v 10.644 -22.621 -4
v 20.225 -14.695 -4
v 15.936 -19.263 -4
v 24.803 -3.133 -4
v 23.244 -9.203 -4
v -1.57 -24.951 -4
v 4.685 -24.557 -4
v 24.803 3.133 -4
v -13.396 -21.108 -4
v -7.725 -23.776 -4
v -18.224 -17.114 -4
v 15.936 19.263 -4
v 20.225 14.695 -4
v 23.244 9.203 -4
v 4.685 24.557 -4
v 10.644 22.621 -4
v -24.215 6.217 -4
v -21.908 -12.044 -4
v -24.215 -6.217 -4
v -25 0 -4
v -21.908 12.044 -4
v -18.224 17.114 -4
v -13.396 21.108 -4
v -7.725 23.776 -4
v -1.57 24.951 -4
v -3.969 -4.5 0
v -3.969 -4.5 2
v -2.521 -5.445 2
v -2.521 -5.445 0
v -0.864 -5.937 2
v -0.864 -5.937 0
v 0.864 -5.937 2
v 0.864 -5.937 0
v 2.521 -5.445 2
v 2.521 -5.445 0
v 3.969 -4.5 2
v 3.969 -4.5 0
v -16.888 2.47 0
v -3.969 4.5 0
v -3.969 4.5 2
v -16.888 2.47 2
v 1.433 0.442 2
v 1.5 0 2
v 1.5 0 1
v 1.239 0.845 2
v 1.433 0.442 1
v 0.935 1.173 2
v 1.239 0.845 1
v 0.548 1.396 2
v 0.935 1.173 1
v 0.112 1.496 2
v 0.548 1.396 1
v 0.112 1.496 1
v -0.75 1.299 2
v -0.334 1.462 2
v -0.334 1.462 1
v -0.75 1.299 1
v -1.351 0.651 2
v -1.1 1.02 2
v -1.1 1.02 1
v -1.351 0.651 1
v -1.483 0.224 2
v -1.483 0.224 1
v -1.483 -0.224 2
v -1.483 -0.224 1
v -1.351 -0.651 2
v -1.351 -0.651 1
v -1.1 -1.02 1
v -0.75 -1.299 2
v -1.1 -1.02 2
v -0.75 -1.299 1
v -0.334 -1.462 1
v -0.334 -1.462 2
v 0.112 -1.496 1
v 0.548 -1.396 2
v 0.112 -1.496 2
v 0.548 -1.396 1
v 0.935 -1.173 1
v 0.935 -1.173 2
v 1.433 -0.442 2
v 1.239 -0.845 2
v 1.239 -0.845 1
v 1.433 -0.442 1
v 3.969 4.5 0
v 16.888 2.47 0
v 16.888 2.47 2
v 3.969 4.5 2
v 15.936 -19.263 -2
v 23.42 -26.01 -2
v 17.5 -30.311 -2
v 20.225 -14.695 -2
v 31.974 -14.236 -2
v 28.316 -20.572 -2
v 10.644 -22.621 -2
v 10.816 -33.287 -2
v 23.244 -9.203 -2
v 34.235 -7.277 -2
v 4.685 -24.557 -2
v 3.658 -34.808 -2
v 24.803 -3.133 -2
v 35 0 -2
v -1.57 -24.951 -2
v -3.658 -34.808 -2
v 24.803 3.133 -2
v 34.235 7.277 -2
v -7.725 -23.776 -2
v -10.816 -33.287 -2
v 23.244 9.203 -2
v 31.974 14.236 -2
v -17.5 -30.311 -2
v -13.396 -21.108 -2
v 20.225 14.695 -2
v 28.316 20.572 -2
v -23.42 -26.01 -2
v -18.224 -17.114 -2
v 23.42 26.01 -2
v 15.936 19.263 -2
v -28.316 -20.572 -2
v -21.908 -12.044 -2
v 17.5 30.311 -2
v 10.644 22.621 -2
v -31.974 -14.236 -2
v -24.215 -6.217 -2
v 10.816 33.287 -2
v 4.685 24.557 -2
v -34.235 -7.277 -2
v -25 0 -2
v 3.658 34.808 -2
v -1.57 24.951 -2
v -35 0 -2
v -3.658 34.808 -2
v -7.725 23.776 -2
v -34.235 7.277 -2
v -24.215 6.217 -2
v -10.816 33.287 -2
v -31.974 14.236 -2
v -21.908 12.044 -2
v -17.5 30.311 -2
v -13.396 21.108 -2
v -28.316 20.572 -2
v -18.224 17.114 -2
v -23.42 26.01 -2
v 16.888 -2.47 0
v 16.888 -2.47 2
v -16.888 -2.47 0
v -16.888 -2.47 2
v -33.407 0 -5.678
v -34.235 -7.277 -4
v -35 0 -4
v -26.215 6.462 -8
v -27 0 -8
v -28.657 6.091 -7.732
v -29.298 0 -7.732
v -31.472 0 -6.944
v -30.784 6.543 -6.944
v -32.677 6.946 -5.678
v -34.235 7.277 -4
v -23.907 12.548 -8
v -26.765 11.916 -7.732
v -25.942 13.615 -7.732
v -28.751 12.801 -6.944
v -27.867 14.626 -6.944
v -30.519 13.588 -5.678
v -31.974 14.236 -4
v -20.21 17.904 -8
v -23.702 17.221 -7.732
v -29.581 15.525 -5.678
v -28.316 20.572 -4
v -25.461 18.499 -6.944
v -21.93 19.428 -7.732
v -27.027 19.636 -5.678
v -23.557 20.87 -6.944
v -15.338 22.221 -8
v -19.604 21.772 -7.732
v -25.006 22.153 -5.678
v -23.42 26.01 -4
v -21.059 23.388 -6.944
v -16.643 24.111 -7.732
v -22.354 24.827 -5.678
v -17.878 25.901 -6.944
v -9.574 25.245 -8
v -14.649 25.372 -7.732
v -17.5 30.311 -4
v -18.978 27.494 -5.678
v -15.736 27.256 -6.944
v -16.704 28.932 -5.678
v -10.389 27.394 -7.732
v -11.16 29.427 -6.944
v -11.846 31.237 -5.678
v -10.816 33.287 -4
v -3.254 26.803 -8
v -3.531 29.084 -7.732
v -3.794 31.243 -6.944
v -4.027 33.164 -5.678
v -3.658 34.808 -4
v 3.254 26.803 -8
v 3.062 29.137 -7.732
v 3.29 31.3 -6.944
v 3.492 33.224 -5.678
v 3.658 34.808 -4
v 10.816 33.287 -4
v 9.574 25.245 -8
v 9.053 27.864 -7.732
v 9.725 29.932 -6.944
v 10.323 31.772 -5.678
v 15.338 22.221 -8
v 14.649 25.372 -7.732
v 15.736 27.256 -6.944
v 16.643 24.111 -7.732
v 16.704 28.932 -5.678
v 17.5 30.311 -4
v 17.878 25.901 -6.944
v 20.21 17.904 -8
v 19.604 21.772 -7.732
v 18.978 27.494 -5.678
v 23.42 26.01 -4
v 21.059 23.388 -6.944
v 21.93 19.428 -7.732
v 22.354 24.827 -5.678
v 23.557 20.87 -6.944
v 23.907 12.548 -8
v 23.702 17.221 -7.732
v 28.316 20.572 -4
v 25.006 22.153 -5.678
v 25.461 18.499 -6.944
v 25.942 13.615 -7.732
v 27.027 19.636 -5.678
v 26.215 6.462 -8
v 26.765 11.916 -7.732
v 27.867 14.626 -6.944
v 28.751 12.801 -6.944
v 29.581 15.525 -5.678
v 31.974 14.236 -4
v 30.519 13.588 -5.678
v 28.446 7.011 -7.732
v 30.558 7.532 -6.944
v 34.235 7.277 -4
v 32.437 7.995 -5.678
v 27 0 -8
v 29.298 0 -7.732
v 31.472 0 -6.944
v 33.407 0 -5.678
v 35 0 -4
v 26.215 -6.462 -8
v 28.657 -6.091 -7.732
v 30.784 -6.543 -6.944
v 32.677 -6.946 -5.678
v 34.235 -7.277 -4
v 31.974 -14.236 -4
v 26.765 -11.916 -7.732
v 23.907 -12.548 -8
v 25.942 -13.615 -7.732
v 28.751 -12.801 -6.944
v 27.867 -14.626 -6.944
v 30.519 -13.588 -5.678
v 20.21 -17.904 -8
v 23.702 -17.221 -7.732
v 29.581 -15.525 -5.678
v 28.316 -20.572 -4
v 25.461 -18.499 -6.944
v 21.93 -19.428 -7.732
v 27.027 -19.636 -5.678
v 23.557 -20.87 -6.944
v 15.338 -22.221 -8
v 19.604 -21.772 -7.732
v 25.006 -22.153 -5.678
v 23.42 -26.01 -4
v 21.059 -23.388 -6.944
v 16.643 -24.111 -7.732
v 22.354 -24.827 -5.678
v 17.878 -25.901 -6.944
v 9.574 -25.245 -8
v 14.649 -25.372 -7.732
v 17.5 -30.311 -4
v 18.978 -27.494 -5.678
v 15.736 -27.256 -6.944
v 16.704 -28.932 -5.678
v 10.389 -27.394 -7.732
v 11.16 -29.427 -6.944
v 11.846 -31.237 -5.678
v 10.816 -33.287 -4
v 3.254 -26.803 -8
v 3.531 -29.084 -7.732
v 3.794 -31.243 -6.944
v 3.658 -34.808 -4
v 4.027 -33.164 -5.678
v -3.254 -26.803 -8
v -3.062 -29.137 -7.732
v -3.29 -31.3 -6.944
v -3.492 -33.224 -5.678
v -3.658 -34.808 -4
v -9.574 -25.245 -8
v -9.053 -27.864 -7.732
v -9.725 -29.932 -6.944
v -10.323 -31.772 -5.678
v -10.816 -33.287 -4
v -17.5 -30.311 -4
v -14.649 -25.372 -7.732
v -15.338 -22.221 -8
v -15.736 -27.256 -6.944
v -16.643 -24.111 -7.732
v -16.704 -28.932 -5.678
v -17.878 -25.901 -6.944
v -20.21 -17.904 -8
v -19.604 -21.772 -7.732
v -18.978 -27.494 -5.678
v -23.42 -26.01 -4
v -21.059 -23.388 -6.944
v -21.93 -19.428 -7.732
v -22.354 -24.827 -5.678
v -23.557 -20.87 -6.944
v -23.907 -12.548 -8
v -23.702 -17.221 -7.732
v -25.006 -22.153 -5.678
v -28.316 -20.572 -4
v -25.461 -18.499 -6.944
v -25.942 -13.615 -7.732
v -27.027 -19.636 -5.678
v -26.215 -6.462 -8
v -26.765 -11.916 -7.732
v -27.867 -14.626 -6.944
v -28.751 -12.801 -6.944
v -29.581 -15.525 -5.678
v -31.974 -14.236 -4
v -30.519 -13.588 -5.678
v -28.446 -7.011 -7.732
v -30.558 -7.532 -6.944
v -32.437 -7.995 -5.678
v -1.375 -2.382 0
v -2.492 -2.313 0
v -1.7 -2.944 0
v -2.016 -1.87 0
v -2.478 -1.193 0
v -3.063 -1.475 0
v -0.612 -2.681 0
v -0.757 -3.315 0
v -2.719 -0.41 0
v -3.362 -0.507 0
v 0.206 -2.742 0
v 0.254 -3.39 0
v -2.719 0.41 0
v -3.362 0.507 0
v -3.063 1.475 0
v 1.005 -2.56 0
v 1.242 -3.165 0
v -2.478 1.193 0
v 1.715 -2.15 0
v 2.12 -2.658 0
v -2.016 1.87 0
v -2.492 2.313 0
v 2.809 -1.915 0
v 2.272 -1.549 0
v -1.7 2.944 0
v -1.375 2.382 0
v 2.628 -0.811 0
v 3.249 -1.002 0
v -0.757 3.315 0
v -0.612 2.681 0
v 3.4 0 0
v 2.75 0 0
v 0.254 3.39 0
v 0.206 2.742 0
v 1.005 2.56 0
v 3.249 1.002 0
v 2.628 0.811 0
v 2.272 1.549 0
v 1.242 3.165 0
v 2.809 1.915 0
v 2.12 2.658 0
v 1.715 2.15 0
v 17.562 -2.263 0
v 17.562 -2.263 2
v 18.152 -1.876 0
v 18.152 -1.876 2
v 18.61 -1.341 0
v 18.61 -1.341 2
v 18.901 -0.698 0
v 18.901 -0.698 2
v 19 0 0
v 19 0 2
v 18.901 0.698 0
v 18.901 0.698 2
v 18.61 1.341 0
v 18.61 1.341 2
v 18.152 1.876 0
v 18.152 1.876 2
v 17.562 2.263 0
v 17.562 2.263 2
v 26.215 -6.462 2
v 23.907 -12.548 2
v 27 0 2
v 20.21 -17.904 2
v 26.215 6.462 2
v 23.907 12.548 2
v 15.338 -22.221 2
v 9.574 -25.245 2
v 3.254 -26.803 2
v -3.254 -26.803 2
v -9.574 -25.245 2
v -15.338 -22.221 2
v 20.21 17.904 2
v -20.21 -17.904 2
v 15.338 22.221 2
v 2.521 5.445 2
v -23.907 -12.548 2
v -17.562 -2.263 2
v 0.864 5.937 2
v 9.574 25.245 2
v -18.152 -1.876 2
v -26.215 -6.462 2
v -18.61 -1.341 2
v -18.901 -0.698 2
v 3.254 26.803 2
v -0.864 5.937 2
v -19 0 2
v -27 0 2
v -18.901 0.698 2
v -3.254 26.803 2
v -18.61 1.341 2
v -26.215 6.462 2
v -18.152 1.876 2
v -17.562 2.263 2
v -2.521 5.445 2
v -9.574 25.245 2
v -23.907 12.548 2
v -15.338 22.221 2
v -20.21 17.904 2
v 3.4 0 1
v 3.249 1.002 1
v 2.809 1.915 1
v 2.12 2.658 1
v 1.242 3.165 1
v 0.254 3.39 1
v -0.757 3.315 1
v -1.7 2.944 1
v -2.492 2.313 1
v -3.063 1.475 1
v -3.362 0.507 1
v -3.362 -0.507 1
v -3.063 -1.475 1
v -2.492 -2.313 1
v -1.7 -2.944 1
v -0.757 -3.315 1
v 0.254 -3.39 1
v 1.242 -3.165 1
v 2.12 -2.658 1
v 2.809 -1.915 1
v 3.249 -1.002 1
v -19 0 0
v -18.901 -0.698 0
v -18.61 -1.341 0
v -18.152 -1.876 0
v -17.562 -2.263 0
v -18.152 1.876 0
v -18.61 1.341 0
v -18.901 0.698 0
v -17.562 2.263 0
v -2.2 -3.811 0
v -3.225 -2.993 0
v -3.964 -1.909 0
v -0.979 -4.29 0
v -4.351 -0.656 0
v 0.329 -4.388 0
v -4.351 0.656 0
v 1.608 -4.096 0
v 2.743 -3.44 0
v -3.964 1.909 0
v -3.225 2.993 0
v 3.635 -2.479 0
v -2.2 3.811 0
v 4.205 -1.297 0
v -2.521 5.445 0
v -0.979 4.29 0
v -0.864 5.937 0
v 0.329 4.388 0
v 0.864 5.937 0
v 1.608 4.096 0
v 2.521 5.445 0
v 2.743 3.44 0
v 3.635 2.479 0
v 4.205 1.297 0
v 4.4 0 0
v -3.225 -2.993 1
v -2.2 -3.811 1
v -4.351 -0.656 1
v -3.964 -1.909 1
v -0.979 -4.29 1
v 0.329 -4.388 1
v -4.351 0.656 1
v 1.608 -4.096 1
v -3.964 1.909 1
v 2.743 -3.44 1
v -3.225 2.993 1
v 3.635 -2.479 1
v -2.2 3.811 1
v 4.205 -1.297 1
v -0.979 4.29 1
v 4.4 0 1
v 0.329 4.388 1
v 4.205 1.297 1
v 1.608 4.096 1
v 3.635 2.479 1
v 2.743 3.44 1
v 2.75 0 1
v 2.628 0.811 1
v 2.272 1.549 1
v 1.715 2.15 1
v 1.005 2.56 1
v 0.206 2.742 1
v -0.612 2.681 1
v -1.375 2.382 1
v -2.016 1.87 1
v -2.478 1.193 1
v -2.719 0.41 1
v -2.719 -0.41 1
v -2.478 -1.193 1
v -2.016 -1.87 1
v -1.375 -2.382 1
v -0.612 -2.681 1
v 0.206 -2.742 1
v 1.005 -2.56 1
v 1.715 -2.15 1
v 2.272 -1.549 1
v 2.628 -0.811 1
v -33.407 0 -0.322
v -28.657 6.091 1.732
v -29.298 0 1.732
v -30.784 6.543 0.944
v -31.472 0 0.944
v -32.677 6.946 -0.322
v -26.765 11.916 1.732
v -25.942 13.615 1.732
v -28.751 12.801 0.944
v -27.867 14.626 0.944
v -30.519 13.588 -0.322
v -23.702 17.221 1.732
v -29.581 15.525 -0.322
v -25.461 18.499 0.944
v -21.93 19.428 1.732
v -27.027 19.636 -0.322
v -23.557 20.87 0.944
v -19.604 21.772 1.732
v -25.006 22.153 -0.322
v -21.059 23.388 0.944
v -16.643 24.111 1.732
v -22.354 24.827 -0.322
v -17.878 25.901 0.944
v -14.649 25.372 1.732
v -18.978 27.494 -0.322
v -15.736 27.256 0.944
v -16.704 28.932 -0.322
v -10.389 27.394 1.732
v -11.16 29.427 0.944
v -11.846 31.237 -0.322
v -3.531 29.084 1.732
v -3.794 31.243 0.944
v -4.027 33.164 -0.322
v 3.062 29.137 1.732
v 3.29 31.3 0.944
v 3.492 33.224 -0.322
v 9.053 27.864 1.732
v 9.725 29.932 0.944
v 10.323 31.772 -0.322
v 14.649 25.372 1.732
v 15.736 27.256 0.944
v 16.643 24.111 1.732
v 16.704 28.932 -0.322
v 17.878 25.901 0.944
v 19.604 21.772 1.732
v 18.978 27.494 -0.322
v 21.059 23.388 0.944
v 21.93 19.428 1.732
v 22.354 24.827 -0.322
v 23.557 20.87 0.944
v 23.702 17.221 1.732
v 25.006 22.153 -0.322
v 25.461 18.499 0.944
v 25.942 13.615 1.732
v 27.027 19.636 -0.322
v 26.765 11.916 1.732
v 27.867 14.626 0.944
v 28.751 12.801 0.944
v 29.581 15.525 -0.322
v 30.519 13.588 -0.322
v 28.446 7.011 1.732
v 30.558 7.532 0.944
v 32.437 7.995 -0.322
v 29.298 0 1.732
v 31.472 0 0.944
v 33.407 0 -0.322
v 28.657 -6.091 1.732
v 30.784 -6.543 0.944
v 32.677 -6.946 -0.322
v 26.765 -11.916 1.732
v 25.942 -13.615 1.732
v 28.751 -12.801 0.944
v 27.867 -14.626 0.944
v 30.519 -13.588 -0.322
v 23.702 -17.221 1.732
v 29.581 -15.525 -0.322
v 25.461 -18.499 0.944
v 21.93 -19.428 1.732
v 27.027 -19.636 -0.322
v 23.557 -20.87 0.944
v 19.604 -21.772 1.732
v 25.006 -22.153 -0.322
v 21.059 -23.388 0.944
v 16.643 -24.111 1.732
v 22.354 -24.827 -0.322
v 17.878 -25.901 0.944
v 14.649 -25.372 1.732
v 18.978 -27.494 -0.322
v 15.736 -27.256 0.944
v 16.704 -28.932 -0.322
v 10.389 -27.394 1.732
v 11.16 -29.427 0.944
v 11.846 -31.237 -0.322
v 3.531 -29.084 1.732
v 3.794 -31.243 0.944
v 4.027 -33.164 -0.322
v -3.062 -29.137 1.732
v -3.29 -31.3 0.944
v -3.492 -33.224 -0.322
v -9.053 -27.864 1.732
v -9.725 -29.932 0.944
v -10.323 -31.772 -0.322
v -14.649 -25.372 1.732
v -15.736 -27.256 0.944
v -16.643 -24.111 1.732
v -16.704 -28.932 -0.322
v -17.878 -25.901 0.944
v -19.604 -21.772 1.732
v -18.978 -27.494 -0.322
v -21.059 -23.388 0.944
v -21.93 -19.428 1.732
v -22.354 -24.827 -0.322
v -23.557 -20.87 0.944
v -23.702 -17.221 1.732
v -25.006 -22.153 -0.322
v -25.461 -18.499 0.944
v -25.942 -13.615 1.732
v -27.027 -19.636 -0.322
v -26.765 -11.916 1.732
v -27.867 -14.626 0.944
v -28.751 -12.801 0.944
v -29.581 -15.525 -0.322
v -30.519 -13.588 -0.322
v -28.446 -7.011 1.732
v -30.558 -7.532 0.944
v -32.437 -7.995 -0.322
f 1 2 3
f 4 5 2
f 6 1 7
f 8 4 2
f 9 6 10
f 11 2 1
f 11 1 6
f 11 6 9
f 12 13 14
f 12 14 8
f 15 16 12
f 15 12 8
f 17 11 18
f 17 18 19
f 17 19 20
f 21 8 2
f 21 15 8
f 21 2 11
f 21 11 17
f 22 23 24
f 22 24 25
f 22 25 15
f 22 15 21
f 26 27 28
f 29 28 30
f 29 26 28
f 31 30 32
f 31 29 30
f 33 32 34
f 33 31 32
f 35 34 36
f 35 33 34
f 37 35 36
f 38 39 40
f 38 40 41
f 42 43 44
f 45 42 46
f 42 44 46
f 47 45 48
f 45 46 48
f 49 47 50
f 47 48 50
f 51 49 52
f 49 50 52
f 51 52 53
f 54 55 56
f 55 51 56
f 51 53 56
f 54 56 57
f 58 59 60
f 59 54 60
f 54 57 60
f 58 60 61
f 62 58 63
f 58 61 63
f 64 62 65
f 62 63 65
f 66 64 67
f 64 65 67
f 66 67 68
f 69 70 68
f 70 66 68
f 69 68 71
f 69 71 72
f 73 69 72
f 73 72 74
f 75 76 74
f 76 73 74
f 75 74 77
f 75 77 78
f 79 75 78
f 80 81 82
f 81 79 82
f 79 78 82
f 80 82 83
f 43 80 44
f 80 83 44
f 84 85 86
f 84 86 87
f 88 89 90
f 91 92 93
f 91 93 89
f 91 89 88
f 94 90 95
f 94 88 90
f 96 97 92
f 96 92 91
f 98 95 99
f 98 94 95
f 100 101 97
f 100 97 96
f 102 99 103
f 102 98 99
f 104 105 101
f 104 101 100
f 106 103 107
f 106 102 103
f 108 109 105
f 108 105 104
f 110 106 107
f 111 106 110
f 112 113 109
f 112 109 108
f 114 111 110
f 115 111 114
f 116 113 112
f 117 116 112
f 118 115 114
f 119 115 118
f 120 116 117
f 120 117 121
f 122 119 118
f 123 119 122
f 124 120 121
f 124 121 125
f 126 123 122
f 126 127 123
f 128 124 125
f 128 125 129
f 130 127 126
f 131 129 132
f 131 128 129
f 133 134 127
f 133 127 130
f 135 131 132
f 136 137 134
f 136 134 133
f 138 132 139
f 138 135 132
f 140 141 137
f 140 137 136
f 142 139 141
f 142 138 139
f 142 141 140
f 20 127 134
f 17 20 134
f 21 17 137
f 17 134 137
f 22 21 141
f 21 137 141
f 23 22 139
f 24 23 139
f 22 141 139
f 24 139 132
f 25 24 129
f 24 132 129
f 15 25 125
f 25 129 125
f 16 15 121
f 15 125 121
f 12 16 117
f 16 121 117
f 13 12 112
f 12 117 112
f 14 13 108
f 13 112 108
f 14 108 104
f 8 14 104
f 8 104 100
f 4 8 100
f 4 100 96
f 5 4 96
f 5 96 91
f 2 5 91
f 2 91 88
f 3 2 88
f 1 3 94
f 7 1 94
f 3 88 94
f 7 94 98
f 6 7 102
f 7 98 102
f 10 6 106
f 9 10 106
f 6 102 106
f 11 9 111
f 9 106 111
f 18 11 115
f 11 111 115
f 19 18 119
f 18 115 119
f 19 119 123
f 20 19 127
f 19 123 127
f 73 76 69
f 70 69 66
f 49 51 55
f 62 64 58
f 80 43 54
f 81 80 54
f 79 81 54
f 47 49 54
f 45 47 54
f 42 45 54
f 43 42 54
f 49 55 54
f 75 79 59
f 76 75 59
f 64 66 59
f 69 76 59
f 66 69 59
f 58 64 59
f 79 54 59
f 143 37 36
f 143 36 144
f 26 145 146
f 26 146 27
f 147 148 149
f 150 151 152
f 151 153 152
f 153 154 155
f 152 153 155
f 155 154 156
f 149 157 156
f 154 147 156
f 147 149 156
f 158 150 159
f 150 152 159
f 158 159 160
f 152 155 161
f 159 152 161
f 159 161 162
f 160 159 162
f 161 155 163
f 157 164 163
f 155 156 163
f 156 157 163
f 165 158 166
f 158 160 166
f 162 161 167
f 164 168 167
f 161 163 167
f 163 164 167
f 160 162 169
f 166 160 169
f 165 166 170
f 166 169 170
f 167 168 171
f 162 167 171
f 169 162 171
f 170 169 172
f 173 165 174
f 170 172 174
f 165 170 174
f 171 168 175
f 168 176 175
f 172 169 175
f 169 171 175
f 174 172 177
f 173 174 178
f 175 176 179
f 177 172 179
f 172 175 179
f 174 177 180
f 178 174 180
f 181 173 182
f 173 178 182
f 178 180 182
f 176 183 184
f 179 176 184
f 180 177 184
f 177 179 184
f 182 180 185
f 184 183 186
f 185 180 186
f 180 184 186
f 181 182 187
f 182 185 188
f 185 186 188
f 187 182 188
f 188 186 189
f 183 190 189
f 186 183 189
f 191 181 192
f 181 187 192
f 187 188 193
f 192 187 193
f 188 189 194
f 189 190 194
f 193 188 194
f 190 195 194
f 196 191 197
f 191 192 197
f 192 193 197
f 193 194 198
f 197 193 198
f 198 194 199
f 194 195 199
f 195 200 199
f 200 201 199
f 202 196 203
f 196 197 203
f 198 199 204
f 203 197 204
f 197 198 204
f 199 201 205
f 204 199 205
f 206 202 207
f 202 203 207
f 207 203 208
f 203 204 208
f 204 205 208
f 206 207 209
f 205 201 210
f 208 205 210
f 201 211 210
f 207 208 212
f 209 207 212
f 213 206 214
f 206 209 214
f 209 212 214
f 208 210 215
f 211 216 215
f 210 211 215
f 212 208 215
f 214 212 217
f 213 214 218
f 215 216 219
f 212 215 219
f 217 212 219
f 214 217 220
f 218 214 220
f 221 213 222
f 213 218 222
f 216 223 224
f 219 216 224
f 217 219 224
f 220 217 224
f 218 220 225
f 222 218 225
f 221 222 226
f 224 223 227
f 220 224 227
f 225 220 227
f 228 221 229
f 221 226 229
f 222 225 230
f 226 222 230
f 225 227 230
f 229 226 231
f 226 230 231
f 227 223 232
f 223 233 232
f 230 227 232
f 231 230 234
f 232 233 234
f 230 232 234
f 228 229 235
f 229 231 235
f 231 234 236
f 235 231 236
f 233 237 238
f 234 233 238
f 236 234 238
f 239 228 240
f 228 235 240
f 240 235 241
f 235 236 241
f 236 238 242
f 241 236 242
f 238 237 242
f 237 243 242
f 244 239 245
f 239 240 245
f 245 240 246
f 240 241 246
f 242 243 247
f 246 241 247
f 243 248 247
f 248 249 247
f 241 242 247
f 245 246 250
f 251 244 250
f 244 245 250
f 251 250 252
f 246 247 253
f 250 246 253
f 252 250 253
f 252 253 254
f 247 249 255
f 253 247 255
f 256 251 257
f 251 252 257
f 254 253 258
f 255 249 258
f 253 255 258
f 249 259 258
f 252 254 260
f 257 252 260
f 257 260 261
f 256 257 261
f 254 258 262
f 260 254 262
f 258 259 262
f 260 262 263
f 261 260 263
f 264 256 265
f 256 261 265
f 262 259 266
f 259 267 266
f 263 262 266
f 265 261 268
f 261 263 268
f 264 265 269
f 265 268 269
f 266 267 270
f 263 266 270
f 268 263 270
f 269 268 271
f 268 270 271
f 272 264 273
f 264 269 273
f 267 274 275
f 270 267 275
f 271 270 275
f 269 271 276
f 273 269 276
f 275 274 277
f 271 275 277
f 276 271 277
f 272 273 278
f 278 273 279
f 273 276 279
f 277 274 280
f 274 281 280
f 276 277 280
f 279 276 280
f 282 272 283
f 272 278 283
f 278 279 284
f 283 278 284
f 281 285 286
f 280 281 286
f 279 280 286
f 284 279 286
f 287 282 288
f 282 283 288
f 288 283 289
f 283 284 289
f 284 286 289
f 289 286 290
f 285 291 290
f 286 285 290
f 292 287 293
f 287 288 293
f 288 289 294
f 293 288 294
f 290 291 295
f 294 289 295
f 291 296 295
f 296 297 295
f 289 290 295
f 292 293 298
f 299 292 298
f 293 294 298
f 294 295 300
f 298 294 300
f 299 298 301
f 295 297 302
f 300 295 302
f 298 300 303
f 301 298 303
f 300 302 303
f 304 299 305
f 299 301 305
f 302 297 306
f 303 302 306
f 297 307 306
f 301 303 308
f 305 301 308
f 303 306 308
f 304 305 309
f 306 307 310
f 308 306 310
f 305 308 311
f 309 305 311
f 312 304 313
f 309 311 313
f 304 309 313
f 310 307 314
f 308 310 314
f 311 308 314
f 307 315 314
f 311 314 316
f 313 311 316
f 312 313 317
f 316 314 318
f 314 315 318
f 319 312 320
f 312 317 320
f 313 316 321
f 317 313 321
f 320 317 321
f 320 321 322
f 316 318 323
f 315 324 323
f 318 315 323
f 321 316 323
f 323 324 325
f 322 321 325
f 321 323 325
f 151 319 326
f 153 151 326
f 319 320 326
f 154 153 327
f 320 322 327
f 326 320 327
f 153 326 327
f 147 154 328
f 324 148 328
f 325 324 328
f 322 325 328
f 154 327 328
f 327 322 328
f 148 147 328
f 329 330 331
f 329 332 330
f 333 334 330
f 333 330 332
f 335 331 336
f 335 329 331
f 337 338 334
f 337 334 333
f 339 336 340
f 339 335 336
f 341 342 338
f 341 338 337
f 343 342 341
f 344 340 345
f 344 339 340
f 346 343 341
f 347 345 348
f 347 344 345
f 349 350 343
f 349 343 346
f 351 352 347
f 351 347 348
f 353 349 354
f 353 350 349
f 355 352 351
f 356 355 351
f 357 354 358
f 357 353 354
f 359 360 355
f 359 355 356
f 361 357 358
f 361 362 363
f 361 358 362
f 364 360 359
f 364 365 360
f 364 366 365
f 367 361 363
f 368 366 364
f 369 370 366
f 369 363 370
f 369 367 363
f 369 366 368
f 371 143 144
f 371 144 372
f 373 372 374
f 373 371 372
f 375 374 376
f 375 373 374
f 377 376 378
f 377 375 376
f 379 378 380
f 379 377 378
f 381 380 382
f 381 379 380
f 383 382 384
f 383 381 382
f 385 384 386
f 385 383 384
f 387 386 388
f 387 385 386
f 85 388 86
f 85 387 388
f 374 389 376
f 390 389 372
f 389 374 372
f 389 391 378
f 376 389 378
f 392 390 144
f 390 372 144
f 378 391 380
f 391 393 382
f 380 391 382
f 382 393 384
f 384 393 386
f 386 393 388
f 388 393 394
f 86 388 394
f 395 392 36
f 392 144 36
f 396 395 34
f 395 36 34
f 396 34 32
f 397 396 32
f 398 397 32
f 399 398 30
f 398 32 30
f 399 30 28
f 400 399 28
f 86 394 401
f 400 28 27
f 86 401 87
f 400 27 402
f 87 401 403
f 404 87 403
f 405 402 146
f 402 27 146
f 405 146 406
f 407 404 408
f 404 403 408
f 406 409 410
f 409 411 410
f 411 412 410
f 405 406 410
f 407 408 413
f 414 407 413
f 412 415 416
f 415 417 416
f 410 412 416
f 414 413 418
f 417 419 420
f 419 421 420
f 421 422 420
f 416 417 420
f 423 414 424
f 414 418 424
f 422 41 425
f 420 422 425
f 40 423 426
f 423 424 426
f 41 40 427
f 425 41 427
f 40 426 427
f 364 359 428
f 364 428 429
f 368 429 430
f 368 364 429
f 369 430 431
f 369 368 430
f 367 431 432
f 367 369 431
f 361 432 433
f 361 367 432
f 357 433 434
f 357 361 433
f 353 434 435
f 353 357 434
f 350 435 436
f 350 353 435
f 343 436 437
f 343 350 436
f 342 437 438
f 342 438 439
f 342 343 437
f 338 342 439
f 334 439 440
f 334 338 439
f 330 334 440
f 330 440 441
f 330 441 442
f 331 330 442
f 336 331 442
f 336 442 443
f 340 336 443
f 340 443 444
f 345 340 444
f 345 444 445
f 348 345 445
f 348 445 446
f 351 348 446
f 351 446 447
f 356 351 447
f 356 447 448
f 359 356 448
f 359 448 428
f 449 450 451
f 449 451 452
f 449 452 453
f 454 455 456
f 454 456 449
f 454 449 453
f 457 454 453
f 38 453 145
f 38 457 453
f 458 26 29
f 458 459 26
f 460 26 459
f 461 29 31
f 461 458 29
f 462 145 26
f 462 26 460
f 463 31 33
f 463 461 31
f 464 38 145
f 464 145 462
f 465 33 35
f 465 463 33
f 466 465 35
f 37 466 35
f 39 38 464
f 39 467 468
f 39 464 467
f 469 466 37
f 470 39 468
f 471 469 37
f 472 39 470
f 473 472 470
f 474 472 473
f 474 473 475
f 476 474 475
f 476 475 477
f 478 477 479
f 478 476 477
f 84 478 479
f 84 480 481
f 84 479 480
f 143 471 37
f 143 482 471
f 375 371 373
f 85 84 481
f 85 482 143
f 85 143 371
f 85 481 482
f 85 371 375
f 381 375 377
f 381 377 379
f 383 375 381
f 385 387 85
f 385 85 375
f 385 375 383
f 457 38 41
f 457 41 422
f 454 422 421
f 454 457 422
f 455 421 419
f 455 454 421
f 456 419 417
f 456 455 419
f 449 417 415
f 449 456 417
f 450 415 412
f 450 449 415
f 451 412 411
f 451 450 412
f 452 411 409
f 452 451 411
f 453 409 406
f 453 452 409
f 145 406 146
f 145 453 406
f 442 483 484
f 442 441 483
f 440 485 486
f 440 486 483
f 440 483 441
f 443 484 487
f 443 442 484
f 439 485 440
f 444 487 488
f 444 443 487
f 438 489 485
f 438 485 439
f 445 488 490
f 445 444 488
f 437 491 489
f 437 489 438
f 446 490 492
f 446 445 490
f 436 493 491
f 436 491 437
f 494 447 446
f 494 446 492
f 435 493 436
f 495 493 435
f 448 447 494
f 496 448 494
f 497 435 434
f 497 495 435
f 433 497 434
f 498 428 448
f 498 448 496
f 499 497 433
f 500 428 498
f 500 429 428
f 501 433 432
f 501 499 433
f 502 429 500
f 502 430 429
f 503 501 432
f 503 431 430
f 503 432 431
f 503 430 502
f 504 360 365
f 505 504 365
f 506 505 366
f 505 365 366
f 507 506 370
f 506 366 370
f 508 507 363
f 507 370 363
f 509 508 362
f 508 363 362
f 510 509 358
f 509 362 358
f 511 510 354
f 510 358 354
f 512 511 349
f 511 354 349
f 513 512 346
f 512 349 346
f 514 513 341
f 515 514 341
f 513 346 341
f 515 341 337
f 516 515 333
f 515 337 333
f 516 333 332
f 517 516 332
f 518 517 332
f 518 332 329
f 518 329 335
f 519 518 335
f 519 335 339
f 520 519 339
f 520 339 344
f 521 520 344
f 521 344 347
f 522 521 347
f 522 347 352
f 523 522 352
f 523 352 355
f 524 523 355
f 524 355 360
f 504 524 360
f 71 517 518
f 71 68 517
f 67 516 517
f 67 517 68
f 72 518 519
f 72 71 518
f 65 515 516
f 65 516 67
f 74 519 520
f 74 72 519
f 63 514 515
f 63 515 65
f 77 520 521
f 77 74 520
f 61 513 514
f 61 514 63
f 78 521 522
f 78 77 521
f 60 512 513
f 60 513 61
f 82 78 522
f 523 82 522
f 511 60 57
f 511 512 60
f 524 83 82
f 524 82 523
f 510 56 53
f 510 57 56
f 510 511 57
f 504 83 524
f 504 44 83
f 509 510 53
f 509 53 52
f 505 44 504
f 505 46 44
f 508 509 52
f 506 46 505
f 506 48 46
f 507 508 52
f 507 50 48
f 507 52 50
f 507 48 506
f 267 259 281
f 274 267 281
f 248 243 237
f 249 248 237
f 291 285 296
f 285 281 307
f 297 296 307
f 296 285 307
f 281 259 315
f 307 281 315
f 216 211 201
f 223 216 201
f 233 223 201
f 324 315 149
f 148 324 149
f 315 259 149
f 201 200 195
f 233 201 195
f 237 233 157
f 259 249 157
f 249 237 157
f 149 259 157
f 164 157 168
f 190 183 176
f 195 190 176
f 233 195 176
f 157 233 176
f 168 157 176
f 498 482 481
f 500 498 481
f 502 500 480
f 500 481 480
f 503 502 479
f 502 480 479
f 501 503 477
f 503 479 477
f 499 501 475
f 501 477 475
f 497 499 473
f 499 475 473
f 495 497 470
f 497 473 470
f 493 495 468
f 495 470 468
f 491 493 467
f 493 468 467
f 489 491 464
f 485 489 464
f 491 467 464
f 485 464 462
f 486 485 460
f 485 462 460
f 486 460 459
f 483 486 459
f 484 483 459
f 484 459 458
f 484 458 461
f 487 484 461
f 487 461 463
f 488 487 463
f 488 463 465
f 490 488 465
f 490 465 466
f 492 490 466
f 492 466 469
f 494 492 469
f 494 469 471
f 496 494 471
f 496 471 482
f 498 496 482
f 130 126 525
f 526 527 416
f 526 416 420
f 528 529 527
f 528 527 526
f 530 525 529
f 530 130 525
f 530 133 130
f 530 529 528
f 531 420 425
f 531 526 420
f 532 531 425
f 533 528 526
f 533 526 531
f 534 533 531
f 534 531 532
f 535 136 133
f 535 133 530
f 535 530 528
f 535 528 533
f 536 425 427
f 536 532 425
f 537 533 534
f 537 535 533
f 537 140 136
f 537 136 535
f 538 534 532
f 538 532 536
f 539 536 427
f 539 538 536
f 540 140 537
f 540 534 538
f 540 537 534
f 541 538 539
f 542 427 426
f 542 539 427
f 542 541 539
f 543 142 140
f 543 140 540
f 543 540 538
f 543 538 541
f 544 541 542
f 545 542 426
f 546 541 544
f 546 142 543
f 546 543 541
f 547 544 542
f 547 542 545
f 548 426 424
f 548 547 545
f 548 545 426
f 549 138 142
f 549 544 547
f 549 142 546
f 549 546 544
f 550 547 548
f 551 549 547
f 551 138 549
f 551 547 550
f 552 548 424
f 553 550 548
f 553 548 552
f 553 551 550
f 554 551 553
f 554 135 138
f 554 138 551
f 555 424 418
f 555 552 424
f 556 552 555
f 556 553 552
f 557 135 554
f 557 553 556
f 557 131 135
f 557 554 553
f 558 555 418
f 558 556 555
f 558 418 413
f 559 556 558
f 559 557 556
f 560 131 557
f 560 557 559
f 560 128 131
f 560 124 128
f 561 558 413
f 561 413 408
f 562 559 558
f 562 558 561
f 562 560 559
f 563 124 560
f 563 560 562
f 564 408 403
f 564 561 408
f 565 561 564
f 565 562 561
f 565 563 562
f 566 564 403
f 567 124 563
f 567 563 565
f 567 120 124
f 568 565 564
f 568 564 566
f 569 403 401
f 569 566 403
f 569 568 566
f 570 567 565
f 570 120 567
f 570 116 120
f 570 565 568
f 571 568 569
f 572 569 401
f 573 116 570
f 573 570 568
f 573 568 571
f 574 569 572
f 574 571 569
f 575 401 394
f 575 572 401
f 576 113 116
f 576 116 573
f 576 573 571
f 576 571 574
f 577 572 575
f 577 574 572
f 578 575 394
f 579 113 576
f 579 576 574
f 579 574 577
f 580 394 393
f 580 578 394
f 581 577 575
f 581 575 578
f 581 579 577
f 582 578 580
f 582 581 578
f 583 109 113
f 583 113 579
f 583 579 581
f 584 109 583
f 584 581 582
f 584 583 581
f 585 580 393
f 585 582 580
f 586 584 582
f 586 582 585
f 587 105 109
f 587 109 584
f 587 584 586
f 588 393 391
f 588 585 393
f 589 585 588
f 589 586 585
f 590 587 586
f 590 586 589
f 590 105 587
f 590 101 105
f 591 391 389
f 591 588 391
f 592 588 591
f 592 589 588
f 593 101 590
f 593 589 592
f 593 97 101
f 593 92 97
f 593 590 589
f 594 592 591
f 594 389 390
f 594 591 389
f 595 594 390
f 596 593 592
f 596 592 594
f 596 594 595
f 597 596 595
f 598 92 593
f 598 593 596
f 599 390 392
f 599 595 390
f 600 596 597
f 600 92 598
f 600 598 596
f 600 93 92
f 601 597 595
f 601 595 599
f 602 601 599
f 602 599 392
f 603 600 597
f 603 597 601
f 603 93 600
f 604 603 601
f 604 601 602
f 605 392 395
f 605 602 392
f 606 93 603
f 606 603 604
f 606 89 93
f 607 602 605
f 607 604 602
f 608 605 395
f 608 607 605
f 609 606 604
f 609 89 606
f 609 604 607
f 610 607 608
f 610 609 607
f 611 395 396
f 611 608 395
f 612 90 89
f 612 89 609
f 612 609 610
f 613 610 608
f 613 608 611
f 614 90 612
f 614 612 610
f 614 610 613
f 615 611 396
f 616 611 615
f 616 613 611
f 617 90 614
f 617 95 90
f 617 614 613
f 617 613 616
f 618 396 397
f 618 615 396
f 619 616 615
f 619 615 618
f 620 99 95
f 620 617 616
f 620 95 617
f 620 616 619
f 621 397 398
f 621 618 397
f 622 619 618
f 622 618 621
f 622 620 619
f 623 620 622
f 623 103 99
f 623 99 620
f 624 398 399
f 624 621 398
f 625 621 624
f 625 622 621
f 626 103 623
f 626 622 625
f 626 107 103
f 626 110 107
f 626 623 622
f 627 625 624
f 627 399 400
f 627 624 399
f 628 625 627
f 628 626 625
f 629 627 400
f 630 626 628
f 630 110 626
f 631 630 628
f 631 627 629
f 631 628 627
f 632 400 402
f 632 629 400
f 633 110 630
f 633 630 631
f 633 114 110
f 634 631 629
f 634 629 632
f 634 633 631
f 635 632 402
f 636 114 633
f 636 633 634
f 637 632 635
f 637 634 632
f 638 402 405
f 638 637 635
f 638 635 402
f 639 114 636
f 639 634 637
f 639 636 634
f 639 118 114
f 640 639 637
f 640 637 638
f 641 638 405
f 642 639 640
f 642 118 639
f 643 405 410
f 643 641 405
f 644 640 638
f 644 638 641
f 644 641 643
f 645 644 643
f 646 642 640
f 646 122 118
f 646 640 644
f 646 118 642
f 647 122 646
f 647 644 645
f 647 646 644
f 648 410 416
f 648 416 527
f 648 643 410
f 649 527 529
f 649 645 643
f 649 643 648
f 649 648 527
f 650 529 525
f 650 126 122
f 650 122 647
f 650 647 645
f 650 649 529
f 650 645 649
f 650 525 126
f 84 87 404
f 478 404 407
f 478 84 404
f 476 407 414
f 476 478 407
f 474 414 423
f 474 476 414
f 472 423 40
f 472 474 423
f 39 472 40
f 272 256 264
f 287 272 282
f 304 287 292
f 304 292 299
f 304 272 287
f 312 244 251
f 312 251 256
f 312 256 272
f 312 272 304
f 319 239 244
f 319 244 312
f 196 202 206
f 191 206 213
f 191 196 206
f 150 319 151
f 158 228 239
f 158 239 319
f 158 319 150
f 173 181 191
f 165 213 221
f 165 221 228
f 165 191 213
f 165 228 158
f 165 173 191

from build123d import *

# Parameters (mm, degrees)
SKETCH_1_R               = 1.5
EXTRUDE_1_DEPTH          = 2.3
SKETCH_2_R               = 4.4
EXTRUDE_2_DEPTH          = 3.2
SKETCH_3_R               = 4.4
SKETCH_3_R_2             = 3.4
SKETCH_3_R_3             = 2.75
SKETCH_3_R_4             = 1.5
CUT_EXTRUDE_1_DEPTH      = 1
BOSS_EXTRUDE1_DEPTH      = 2
BOSS_EXTRUDE1_DEPTH_BACK = 2
SKETCH1_R                = 35
INTERSECT2_OUTLINE_R     = 4.4
INTERSECT2_OUTLINE_R_2   = 3.4
INTERSECT2_OUTLINE_R_3   = 2.75
INTERSECT2_DEPTH         = 5.5
INTERSECT2_START         = 1
INTERSECT2_2_OUTLINE_R   = 4.4
INTERSECT2_2_OUTLINE_R_2 = 3.4
INTERSECT2_2_OUTLINE_R_3 = 2.75
INTERSECT2_2_OUTLINE_R_4 = 1.5
INTERSECT2_2_DEPTH       = 4.5
FILLET1_R                = 10
SKETCH2_R                = 25
BOSS_EXTRUDE2_DEPTH      = 2
SKETCH3_R                = 27
BOSS_EXTRUDE3_DEPTH      = 2


# Read off the part's stored shape, not the designer's step: Intersect2
with BuildPart() as part:
    # Эскиз1 → Бобышка-Вытянуть1 (new body)
    with BuildSketch(Plane.XY):
        with BuildLine():
            Line((-3.968626967, 4.5), (-16.888114198, 2.469689731))
            ThreePointArc((-16.888114198, 2.469689731), (-19, 0), (-16.888114198, -2.469689731))
            Line((-16.888114198, -2.469689731), (-3.968626967, -4.5))
            ThreePointArc((-3.968626967, -4.5), (0, -6), (3.968626967, -4.5))
            Line((3.968626967, -4.5), (16.888114198, -2.469689731))
            ThreePointArc((16.888114198, -2.469689731), (19, 0), (16.888114198, 2.469689731))
            Line((16.888114198, 2.469689731), (3.968626967, 4.5))
            ThreePointArc((3.968626967, 4.5), (0, 6), (-3.968626967, 4.5))
        make_face()
        Circle(SKETCH_1_R, mode=Mode.SUBTRACT)
    extrude(amount=EXTRUDE_1_DEPTH)

    # Эскиз2 → Бобышка-Вытянуть2 (add)
    with BuildSketch(Plane.XY.offset(2.3)):
        with Locations(Location((0, 0, 0), (0, 0, 180))):
            Circle(SKETCH_2_R)
        Polygon((0.333439775, 2.639447604), (0, 3.05), (-0.333439775, 2.639447604), (-0.758504156, 2.954178641), (-0.979368078, 2.473601404), (-1.469348706, 2.672735374), (-1.563759083, 2.15232973), (-2.087868673, 2.223354314), (-2.049893354, 1.695819264), (-2.575200173, 1.634271725), (-2.407225286, 1.132754236), (-2.900722375, 0.942501833), (-2.6133024, 0.498514094), (-3.043981522, 0.191511085), (-2.655176114, -0.167049522), (-2.995976115, -0.571513009), (-2.530215347, -0.822116802), (-2.75972251, -1.298626839), (-2.246271844, -1.42552746), (-2.35006539, -1.944143169), (-1.821186821, -1.939366985), (-1.792745019, -2.467501833), (-1.281669931, -2.33134895), (-1.122779886, -2.835818282), (-0.661621006, -2.576843686), (-0.382266362, -3.025949839), (0, -2.660425857), (0.382266362, -3.025949839), (0.661621006, -2.576843686), (1.122779886, -2.835818282), (1.281669931, -2.33134895), (1.792745019, -2.467501833), (1.821186821, -1.939366985), (2.35006539, -1.944143169), (2.246271844, -1.42552746), (2.75972251, -1.298626839), (2.530215347, -0.822116802), (2.995976115, -0.571513009), (2.655176114, -0.167049522), (3.043981522, 0.191511085), (2.6133024, 0.498514094), (2.900722375, 0.942501833), (2.407225286, 1.132754236), (2.575200173, 1.634271725), (2.049893354, 1.695819264), (2.087868673, 2.223354314), (1.563759083, 2.15232973), (1.469348706, 2.672735374), (0.979368078, 2.473601404), (0.758504156, 2.954178641), align=None, mode=Mode.SUBTRACT)
    extrude(amount=EXTRUDE_2_DEPTH)

    # Эскиз3 → Вырез-Вытянуть1 (cut)
    # profile 1 of 2: a face of its own
    with BuildSketch(Plane(origin=(0, 0, 0), x_dir=(-1, 0, 0), z_dir=(0, 0, -1))):
        Circle(SKETCH_3_R)
        Circle(SKETCH_3_R_2, mode=Mode.SUBTRACT)
    # profile 2 of 2: a face of its own
    with BuildSketch(Plane(origin=(0, 0, 0), x_dir=(-1, 0, 0), z_dir=(0, 0, -1))):
        Circle(SKETCH_3_R_3)
        Circle(SKETCH_3_R_4, mode=Mode.SUBTRACT)
    extrude(amount=-CUT_EXTRUDE_1_DEPTH, mode=Mode.SUBTRACT)


with BuildPart() as body_2:
    # Sketch1 → Boss-Extrude1 (new, two sides: drawn at the far end of the back side and taken through both)
    with BuildSketch(Plane(origin=(0, 0, 0), x_dir=(-1, 0, 0), z_dir=(0, 0, -1)).offset(-BOSS_EXTRUDE1_DEPTH_BACK)):
        Circle(SKETCH1_R)
    extrude(amount=BOSS_EXTRUDE1_DEPTH + BOSS_EXTRUDE1_DEPTH_BACK)


with BuildPart() as intersect2_tool:
    # Intersect2 outline → Intersect2 (new body)
    # profile 1 of 2: a face of its own
    with BuildSketch(Plane.XY):
        with BuildLine():
            ThreePointArc((3.968626967, 4.5), (0, 6), (-3.968626967, 4.5))
            Line((-3.968626967, 4.5), (-16.888114198, 2.469689731))
            ThreePointArc((-16.888114198, 2.469689731), (-19, 0), (-16.888114198, -2.469689731))
            Line((-16.888114198, -2.469689731), (-3.968626967, -4.5))
            ThreePointArc((-3.968626967, -4.5), (0, -6), (3.968626967, -4.5))
            Line((3.968626967, -4.5), (16.888114198, -2.469689731))
            ThreePointArc((16.888114198, -2.469689731), (19, 0), (16.888114198, 2.469689731))
            Line((16.888114198, 2.469689731), (3.968626967, 4.5))
        make_face()
        Circle(INTERSECT2_OUTLINE_R, mode=Mode.SUBTRACT)
    # profile 2 of 2: a face of its own
    with BuildSketch(Plane.XY):
        Circle(INTERSECT2_OUTLINE_R_2)
        Circle(INTERSECT2_OUTLINE_R_3, mode=Mode.SUBTRACT)
    extrude(amount=INTERSECT2_DEPTH)


with BuildPart() as part_1:
    add(part.part)

    # Intersect2: cut by intersect2_tool
    add(intersect2_tool.part, mode=Mode.SUBTRACT)


with BuildPart() as body_2_1:
    add(body_2.part)

    # Intersect2: cut by intersect2_tool
    add(intersect2_tool.part, mode=Mode.SUBTRACT)


with BuildPart() as intersect2_2_tool:
    # Intersect2 2 outline → Intersect2 2 (new body)
    # profile 1 of 2: a face of its own
    with BuildSketch(Plane.XY.offset(INTERSECT2_START)):
        Circle(INTERSECT2_2_OUTLINE_R)
        Circle(INTERSECT2_2_OUTLINE_R_2, mode=Mode.SUBTRACT)
    # profile 2 of 2: a face of its own
    with BuildSketch(Plane.XY.offset(INTERSECT2_START)):
        Circle(INTERSECT2_2_OUTLINE_R_3)
        Circle(INTERSECT2_2_OUTLINE_R_4, mode=Mode.SUBTRACT)
    extrude(amount=INTERSECT2_2_DEPTH)


with BuildPart() as part_2:
    add(part_1.part)

    # Intersect2 2: cut by intersect2_2_tool
    add(intersect2_2_tool.part, mode=Mode.SUBTRACT)


with BuildPart() as body_2_2:
    add(body_2_1.part)

    # Intersect2 2: cut by intersect2_2_tool
    add(intersect2_2_tool.part, mode=Mode.SUBTRACT)

    # Fillet1
    # the kernel refuses this fillet: 10 mm, written as the material it takes off along each edge
    with BuildSketch(Plane(origin=(0, 0, 2), x_dir=(-1, 0, 0), z_dir=(0, -1, 0))) as fillet1_piece_1:
        with BuildLine():
            CenterArc((27, 10), FILLET1_R, 270, 53.130102354)
            Line((27, 0), (27, -0.2))
            Line((27, -0.2), (35, -0.2))
            Line((35, -0.2), (35.2, 0))
            ThreePointArc((35.2, 0), (35.2, 2), (35.16, 3.88))
            Line((35.16, 3.88), (35, 4))
        make_face()
    revolve(axis=Axis((0, 0, 2), (0, 0, -1)), mode=Mode.SUBTRACT)


with BuildPart() as body_2_2_1:
    # Mirror9: mirrored copy
    add(body_2_2.part.mirror(Plane.XY.offset(-3)))

    # Sketch3 → Boss-Extrude3 (add)
    with BuildSketch(Plane(origin=(0, 0, -8), x_dir=(-1, 0, 0), z_dir=(0, 0, -1))):
        Circle(SKETCH3_R)
    extrude(amount=-BOSS_EXTRUDE3_DEPTH)


with BuildPart() as body_2_3:
    add(body_2_2.part)

    # Sketch2 → Boss-Extrude2 (add)
    with BuildSketch(Plane(origin=(0, 0, -2), x_dir=(-1, 0, 0), z_dir=(0, 0, -1))):
        Circle(SKETCH2_R)
    extrude(amount=BOSS_EXTRUDE2_DEPTH)


solid = Compound([body_2_2_1.part, body_2_3.part])
